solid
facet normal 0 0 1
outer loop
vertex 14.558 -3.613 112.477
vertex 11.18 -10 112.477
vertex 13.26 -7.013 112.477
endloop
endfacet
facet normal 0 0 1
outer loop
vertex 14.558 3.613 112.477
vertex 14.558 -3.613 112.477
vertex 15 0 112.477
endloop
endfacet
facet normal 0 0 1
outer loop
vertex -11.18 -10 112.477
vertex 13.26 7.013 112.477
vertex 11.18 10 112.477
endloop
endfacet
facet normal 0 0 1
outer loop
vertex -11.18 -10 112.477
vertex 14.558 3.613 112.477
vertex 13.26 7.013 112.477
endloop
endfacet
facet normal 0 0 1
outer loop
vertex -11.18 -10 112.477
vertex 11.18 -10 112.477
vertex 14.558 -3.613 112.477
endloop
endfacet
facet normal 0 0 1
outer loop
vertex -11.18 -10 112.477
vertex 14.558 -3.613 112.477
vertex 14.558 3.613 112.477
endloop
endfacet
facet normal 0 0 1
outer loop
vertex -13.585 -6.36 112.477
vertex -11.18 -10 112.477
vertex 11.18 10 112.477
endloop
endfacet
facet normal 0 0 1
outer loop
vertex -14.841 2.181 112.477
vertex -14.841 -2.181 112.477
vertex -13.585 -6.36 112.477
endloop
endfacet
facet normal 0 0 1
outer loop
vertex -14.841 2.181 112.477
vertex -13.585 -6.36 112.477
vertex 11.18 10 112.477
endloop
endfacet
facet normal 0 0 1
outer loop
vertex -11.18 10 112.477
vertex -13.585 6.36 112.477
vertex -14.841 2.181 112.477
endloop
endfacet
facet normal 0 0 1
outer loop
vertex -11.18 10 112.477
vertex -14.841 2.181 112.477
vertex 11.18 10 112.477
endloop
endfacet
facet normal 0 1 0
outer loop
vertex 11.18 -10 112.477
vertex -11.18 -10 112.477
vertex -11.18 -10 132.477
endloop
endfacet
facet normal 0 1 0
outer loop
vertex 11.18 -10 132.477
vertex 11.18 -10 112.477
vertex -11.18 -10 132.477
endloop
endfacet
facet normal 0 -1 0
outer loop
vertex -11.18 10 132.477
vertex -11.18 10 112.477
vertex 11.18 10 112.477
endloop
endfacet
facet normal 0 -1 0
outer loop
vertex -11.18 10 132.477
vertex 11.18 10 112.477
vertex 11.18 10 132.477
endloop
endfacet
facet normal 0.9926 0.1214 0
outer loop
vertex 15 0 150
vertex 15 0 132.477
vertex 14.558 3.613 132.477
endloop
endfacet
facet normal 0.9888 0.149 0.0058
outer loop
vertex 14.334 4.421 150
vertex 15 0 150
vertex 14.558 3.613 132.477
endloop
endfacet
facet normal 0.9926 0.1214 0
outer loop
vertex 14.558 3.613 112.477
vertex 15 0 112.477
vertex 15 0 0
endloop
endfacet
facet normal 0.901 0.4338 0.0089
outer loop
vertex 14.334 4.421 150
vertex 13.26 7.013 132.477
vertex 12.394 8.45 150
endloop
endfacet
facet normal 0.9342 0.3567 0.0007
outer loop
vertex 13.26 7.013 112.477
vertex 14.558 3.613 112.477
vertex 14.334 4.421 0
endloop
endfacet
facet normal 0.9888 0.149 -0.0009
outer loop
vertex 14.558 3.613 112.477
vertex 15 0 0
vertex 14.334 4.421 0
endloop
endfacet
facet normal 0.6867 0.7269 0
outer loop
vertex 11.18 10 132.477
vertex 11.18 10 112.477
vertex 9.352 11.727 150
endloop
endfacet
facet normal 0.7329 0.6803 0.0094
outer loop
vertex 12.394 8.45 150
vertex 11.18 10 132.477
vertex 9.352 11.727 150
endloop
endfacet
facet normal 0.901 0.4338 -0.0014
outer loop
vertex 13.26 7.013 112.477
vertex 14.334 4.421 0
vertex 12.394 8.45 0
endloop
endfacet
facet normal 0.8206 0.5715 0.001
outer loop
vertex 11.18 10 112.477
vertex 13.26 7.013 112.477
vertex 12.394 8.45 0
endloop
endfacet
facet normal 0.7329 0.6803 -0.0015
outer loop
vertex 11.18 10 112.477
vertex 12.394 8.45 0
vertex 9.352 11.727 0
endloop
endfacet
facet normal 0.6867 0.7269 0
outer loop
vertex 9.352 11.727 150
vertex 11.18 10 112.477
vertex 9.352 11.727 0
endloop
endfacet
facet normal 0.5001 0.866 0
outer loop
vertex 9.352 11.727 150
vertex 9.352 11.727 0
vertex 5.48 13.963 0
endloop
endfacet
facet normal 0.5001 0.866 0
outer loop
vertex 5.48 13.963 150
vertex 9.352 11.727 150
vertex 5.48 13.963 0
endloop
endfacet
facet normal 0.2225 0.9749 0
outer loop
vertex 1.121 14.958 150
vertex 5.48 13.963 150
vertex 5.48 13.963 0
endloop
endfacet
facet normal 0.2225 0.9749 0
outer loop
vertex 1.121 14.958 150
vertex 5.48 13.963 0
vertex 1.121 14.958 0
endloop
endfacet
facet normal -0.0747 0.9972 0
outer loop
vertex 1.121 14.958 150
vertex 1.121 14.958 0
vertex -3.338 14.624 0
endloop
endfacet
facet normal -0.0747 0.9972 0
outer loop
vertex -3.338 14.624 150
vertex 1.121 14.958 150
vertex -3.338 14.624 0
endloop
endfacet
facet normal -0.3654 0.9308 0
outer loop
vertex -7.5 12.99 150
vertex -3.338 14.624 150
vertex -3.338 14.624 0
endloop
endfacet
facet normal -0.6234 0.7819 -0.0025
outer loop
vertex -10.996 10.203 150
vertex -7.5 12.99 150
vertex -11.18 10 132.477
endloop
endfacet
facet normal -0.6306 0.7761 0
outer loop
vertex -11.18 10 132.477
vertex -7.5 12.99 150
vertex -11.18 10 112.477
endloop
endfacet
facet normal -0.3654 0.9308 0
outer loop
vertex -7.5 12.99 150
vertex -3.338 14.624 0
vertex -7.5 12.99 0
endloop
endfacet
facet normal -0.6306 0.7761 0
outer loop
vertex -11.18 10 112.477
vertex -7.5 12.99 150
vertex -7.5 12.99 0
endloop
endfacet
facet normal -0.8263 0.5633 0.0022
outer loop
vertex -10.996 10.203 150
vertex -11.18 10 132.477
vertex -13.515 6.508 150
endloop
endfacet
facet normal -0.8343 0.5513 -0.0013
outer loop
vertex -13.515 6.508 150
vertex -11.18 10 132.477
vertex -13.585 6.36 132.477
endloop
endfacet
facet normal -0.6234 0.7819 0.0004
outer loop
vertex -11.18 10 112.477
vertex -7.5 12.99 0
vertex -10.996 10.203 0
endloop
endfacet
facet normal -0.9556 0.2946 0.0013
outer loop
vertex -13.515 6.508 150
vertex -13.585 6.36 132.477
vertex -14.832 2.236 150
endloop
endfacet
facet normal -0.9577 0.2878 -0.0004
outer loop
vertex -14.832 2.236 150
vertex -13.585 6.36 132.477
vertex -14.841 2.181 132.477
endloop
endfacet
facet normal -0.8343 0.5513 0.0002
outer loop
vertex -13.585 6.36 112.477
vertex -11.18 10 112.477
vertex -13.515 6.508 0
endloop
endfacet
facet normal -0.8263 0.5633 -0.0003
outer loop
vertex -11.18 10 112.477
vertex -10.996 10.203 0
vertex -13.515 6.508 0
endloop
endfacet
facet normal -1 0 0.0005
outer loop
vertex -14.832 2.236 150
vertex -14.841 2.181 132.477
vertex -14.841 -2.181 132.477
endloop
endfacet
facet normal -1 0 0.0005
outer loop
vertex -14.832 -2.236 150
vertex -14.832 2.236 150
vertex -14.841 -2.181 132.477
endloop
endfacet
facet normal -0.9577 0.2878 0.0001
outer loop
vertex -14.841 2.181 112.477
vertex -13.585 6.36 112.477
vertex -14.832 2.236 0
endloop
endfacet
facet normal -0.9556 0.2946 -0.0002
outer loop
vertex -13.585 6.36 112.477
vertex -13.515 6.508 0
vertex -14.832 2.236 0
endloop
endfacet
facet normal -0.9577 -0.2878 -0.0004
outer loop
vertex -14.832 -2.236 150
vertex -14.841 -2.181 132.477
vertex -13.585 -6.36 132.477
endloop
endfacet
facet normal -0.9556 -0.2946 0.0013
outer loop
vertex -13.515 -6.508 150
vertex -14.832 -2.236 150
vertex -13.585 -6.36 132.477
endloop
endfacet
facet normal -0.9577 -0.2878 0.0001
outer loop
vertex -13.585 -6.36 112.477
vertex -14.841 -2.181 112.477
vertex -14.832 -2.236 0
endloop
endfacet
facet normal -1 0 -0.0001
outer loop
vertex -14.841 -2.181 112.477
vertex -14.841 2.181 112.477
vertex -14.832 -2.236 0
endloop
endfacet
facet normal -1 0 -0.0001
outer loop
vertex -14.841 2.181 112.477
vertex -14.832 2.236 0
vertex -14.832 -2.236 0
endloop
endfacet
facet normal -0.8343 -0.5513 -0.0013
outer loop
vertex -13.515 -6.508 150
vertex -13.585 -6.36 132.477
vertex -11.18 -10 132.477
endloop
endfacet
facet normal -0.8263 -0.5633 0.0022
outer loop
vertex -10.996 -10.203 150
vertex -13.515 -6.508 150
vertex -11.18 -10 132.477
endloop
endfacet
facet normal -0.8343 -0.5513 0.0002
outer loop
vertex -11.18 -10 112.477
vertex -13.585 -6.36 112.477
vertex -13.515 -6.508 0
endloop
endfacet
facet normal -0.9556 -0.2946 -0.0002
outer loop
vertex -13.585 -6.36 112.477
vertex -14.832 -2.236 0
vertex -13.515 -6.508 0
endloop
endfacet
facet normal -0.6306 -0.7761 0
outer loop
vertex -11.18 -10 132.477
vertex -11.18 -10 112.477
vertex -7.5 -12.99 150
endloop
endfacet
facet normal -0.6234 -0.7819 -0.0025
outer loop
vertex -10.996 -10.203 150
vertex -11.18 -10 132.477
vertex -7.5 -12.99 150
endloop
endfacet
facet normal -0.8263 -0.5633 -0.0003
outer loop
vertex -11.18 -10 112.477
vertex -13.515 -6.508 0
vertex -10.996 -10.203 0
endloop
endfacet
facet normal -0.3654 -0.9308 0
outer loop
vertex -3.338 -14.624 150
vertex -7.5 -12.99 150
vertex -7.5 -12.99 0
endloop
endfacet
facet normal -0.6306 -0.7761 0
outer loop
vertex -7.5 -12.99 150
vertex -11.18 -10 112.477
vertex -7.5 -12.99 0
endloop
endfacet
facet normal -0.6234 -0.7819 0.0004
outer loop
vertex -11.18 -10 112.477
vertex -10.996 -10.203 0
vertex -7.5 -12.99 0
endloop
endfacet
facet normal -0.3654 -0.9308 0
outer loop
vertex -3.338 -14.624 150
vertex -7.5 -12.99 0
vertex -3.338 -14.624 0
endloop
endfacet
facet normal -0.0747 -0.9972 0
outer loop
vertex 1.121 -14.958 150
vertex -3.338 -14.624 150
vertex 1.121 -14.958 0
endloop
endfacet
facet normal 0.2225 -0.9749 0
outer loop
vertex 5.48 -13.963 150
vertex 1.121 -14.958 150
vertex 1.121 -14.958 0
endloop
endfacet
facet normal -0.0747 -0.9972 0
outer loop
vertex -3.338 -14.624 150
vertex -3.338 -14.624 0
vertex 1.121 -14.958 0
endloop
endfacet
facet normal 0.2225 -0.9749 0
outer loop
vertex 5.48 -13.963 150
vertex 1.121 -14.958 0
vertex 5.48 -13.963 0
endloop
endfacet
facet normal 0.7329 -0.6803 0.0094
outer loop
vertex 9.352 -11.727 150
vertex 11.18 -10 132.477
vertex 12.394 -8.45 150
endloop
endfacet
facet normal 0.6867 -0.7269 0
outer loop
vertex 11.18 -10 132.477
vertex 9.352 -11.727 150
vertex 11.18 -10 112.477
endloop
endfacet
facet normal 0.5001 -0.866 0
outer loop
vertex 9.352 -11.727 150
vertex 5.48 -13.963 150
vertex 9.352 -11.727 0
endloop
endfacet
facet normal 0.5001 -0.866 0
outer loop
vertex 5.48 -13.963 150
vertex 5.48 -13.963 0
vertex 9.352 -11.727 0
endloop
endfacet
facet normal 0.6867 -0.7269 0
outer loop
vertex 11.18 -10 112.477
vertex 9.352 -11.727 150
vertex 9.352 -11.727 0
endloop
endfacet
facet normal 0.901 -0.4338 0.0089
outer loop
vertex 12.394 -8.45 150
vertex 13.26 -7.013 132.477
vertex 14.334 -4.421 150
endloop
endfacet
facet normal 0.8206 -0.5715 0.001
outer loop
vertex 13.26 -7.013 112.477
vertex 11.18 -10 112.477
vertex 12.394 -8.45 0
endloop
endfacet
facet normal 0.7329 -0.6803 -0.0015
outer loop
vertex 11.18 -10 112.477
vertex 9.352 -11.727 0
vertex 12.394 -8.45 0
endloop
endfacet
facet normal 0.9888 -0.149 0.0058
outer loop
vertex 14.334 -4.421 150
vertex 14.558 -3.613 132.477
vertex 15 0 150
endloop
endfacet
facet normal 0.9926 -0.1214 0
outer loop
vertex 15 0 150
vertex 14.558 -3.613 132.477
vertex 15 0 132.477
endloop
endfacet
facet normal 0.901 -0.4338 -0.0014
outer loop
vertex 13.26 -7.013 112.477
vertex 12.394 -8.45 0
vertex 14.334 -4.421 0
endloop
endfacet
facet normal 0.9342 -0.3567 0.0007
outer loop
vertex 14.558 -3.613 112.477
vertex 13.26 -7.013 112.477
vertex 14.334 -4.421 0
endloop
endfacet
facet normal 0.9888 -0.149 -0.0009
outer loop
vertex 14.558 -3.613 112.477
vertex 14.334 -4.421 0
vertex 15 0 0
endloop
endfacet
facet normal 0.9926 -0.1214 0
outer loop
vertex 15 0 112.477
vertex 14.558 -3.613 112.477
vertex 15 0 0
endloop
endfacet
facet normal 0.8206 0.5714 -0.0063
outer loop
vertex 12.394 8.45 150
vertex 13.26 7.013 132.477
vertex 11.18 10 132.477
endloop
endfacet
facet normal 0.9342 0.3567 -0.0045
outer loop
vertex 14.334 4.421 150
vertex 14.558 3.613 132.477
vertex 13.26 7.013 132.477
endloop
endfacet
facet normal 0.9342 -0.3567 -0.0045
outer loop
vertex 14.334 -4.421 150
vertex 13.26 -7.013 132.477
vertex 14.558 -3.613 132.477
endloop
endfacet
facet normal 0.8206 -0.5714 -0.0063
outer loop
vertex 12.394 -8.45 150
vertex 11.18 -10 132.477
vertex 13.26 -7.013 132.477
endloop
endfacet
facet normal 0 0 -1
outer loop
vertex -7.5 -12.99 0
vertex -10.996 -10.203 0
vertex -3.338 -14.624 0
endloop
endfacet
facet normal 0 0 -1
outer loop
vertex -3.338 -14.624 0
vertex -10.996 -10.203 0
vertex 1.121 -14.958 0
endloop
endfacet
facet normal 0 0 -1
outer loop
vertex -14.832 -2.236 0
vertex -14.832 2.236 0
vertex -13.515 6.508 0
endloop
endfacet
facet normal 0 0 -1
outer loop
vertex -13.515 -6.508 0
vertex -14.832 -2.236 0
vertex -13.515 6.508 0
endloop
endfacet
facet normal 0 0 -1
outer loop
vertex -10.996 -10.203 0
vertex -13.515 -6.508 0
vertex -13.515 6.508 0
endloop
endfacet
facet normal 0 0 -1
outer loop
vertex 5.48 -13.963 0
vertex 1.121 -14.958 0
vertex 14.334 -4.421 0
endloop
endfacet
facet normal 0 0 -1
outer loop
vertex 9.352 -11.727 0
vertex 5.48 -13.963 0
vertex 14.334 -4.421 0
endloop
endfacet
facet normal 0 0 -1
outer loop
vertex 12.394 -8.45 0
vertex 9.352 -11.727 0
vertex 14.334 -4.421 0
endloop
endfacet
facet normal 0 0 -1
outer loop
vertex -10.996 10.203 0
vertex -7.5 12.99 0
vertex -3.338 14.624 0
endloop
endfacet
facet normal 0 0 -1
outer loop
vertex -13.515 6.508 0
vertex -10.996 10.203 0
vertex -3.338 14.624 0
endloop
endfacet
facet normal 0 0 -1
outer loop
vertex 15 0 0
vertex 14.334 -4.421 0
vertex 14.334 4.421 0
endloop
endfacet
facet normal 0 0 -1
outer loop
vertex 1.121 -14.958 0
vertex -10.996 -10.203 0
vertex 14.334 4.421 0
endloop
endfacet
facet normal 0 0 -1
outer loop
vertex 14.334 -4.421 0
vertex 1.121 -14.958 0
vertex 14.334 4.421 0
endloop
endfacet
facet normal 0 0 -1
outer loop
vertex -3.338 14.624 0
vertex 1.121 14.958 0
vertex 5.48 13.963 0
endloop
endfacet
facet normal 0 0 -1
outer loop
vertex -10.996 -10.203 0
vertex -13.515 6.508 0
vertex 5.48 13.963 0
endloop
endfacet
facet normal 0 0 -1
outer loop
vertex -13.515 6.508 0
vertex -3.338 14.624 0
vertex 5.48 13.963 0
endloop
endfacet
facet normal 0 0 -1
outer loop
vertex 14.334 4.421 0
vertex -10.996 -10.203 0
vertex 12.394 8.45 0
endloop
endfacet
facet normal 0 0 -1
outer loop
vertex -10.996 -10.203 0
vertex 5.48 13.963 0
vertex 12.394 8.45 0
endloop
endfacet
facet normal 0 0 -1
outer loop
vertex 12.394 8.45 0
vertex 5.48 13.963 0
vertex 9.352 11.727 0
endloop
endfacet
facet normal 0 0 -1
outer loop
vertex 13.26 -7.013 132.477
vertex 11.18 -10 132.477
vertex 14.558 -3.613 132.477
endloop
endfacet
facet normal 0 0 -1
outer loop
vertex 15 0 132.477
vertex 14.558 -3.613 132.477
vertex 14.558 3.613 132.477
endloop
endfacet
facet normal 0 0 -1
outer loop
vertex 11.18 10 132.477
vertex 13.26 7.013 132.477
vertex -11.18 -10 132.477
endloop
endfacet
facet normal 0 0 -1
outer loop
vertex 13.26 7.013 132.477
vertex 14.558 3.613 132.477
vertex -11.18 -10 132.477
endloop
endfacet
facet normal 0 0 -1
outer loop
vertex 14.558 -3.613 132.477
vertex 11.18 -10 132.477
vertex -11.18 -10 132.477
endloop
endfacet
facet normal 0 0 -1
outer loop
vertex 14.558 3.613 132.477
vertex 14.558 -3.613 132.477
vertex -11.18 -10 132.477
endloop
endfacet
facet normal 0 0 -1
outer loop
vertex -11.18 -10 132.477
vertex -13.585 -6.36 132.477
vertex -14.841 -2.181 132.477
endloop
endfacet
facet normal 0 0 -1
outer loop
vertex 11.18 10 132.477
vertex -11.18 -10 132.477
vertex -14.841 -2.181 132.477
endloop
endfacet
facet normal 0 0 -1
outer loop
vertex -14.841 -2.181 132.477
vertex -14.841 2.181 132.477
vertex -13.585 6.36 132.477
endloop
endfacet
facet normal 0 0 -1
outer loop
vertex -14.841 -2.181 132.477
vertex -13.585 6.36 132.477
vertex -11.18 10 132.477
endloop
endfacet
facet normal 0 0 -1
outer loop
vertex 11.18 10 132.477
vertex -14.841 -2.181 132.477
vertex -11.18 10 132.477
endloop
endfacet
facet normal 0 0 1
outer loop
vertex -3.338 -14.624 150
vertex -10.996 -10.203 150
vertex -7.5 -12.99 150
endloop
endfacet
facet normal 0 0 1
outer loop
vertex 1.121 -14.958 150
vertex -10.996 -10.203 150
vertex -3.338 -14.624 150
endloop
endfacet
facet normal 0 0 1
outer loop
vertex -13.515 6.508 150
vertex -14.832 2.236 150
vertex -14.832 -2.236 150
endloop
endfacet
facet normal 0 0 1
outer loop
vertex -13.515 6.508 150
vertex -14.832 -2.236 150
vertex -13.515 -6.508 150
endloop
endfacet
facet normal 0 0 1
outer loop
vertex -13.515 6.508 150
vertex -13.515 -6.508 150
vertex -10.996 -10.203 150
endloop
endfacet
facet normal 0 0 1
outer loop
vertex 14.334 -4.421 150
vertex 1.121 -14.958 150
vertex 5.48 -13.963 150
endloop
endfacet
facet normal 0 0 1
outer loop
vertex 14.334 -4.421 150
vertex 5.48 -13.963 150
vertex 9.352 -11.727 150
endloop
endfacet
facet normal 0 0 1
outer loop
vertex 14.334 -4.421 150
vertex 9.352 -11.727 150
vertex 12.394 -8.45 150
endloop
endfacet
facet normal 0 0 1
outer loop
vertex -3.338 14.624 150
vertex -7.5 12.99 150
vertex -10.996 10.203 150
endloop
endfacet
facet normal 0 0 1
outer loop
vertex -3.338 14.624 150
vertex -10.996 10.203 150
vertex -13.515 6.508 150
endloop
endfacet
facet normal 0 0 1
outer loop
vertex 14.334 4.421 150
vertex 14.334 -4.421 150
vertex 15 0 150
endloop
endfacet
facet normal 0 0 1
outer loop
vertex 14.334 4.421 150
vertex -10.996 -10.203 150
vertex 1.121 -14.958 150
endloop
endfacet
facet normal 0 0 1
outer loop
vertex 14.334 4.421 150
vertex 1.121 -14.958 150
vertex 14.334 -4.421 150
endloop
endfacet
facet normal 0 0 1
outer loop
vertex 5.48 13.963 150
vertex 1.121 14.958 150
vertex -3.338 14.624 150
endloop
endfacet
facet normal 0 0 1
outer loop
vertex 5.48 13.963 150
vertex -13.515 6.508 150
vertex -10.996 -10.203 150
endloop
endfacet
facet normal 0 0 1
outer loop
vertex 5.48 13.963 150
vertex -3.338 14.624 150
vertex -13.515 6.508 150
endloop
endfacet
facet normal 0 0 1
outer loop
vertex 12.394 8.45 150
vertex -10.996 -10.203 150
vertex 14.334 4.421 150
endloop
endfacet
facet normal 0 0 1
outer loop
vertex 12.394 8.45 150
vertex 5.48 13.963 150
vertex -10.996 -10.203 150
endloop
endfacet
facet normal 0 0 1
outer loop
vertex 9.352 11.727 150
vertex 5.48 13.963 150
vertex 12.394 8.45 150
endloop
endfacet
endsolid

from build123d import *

# Parameters (mm, degrees)
F0_R          = 15
F1_DEPTH      = 150
F2_W          = 20
F2_H          = 20
F3_DEPTH      = 15
F3_DEPTH_BACK = 15


with BuildPart() as f1:
    # F0 (on Top) → F1 (new body)
    with BuildSketch(Plane.XY):
        Circle(F0_R)
    extrude(amount=F1_DEPTH)

    # F2 (on Right) → F3 (cut, two sides)
    with BuildSketch(Plane.YZ) as f3_sk:
        with Locations((0, 122.4774739146)):
            Rectangle(F2_W, F2_H)
    extrude(amount=-F3_DEPTH, mode=Mode.SUBTRACT)
    extrude(f3_sk.sketch, amount=F3_DEPTH_BACK, mode=Mode.SUBTRACT)


solid = f1.part
